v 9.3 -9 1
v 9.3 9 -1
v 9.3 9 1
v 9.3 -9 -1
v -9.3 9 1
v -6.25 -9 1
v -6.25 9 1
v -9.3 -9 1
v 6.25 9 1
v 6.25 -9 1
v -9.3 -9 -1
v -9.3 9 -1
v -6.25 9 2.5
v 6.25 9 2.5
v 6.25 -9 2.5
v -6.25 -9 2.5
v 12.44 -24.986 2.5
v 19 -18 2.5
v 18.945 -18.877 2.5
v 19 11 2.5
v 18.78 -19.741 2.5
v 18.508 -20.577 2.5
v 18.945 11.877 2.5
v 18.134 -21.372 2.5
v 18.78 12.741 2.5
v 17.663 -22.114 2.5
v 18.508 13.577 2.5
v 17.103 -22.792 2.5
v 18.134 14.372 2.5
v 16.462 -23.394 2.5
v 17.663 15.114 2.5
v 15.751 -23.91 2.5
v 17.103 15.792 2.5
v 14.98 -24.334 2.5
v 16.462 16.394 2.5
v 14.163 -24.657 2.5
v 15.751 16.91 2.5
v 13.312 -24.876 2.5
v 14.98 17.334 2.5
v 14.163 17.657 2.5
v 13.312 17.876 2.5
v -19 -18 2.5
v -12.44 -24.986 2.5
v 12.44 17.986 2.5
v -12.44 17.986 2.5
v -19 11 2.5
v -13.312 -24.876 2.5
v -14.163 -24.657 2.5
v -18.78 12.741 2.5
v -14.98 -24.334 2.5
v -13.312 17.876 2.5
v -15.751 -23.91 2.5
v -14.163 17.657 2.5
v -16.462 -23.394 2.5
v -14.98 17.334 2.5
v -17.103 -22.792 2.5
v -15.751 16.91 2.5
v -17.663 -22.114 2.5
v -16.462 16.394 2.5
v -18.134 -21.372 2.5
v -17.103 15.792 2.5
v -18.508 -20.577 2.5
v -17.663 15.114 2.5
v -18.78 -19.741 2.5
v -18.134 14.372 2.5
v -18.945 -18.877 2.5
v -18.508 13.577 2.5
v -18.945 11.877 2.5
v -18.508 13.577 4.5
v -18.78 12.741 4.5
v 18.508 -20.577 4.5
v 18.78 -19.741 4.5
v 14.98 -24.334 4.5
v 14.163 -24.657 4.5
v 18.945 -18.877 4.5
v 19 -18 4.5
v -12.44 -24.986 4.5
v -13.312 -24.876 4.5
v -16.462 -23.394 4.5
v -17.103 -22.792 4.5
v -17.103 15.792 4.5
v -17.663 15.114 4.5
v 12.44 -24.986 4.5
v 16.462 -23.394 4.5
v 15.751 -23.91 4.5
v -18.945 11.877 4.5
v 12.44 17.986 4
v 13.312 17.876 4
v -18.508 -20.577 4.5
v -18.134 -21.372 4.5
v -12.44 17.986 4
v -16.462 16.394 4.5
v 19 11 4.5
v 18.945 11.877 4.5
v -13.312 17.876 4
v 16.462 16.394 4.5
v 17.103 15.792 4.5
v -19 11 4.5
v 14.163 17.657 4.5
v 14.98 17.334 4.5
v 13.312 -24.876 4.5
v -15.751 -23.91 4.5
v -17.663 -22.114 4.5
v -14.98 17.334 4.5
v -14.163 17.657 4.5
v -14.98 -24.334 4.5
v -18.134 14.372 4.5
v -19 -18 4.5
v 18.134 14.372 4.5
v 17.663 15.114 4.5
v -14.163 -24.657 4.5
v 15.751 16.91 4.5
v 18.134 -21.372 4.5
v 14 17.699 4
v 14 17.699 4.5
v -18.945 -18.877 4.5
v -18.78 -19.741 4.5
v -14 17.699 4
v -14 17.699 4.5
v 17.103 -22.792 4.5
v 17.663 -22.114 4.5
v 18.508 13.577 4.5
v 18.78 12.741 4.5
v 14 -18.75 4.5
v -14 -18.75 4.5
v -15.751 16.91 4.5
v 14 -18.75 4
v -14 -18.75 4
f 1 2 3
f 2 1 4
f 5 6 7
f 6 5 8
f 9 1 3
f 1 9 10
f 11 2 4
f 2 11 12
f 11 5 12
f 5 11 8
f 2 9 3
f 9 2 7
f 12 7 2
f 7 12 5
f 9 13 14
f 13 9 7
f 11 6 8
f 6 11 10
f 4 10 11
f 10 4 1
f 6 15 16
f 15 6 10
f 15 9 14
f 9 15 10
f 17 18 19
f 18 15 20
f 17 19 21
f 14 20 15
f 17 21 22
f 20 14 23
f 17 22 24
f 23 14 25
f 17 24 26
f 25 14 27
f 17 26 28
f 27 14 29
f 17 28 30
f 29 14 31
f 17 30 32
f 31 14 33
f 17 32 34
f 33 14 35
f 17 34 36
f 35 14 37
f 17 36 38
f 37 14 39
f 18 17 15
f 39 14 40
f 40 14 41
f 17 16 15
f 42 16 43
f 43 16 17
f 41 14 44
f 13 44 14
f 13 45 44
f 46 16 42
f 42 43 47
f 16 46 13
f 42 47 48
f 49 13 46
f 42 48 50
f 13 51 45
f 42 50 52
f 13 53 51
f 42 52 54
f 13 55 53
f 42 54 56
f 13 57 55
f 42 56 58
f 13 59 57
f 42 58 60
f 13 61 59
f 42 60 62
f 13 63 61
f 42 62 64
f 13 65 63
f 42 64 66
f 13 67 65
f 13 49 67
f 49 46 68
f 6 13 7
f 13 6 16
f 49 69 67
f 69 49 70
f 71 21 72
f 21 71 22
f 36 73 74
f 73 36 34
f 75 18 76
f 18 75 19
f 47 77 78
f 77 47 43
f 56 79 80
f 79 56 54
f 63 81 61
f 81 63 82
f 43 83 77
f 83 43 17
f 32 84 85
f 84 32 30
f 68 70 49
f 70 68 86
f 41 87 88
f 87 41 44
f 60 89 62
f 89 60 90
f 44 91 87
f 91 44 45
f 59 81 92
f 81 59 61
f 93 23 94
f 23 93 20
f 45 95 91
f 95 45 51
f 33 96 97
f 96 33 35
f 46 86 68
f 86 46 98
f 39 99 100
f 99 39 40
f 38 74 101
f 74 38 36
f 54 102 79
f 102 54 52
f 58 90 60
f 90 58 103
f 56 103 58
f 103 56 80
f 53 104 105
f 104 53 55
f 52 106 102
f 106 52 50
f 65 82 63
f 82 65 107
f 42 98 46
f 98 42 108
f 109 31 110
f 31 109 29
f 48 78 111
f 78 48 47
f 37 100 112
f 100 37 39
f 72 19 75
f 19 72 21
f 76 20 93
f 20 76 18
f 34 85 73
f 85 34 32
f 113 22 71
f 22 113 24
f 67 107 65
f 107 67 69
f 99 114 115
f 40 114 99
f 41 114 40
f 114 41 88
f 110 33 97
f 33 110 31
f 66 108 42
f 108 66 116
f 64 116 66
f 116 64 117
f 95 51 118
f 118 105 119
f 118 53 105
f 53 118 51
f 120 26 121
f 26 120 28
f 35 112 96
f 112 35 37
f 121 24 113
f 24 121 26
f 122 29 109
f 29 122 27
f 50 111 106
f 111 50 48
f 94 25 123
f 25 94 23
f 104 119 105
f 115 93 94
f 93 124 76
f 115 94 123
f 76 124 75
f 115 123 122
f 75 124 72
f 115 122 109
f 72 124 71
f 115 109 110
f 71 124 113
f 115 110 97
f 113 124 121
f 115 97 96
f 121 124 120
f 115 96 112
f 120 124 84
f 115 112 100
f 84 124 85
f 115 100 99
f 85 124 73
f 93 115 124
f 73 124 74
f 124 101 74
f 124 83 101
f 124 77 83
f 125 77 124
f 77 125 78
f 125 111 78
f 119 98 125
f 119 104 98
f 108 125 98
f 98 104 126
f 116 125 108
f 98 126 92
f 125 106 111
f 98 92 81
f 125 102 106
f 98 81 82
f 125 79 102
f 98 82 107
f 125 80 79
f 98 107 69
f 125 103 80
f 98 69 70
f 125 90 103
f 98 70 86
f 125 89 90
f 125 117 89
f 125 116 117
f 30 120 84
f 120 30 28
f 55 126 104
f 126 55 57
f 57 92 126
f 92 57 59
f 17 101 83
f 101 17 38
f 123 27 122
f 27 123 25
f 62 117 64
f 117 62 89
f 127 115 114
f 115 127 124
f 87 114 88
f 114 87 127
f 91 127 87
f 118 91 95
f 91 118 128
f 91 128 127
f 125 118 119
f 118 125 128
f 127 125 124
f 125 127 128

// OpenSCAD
module cold_shoe_insert() {
    color([0,0.5,1])
    // per ISO 518:2006(E), page 3 - inner insert
    cube([18.6, 18, 2], center=true);

    translate([0,0,(2 + 1.5) / 2]) {
      color([0,0,1])
      // per ISO 518:2006(E), page 3 - between "teeth"
      cube([12.5, 18, 1.5], center=true);
    }
}


module tentacle_sync_e_velcro_mount(table_height, table_margin, velcro_pad_margin, velcro_dip, minkowski_cylinder_r) {
    // TOOD: can I guard against it?
    // minkowski_cylinder_r is up to 21 for whatever reason, then it degrades into a full circle

    // per official website
    tentacle_width = 38;
    tentacle_length = 50;
    
    // as stated by Tentcle support staff when asked on May 28, 2022
    inbuilt_velcro_pad_width = 20;
    inbuilt_velcro_pad_length = 29.5;

    // self-measured, but I've already asked Tentacle
    locking_connector_dip = 5;
    
    // TODO: this cannot be really parametrized yet
    locking_connector_dip_margin = 2;
    
    translate([0,0, table_height / 2]) {
        difference() {
            $fn=50;
            minkowski() {
                difference() {
                    cube([tentacle_width + table_margin - 2 * minkowski_cylinder_r, tentacle_length + table_margin - 2 * minkowski_cylinder_r, table_height / 2], center = true);
                    
                    // TODO: figure out why there has to be this shitty -1 and the y axis
                    color([0,1,0])
                    translate([0,(tentacle_width + table_margin - 2 * minkowski_cylinder_r) / 2 + (locking_connector_dip + locking_connector_dip_margin) / 2 - 1 ,0])
                    cube([tentacle_width + table_margin - 2 * minkowski_cylinder_r, locking_connector_dip + locking_connector_dip_margin, table_height / 2], center=true);
                }
                
                color([0,1,0])
                cylinder(r=minkowski_cylinder_r,h=table_height / 2, center = true);
            }
            
            color([1,0,0])
            translate([0,0,table_height / 2])
            // the 2x compsensates for centering and it's easier to wrok with that way
            cube([inbuilt_velcro_pad_width + velcro_pad_margin, inbuilt_velcro_pad_length + velcro_pad_margin, 2 * velcro_dip], center = true);
        }
    }
}



cold_shoe_insert();
cold_shoe_over_0_height = (2 / 2) + 1.5;

translate([0,0,cold_shoe_over_0_height]) {
    // prototype 2
    // TODO: 45deg chaufer on the velcro dip
    // TODO: velcro pad is too wide and too short (verify and measure with gen2mk1)
    
    // PARAMETER_EXPERIMENT 2mm height, 3 is cool but let's see
    // PARAMETER_EXPERIMENT 0mm table margin, 5 is cool but let's see
    // label as gen 2 mark 2

    // prototype 3
    // label as gen 2 mark 3 [if necessary]
 
    // official pads are ~7mm bigger than the inbuild pads
    tentacle_sync_e_velcro_mount(table_height=2, table_margin=0, velcro_pad_margin=8, velcro_dip=0.5, minkowski_cylinder_r=7);
}
